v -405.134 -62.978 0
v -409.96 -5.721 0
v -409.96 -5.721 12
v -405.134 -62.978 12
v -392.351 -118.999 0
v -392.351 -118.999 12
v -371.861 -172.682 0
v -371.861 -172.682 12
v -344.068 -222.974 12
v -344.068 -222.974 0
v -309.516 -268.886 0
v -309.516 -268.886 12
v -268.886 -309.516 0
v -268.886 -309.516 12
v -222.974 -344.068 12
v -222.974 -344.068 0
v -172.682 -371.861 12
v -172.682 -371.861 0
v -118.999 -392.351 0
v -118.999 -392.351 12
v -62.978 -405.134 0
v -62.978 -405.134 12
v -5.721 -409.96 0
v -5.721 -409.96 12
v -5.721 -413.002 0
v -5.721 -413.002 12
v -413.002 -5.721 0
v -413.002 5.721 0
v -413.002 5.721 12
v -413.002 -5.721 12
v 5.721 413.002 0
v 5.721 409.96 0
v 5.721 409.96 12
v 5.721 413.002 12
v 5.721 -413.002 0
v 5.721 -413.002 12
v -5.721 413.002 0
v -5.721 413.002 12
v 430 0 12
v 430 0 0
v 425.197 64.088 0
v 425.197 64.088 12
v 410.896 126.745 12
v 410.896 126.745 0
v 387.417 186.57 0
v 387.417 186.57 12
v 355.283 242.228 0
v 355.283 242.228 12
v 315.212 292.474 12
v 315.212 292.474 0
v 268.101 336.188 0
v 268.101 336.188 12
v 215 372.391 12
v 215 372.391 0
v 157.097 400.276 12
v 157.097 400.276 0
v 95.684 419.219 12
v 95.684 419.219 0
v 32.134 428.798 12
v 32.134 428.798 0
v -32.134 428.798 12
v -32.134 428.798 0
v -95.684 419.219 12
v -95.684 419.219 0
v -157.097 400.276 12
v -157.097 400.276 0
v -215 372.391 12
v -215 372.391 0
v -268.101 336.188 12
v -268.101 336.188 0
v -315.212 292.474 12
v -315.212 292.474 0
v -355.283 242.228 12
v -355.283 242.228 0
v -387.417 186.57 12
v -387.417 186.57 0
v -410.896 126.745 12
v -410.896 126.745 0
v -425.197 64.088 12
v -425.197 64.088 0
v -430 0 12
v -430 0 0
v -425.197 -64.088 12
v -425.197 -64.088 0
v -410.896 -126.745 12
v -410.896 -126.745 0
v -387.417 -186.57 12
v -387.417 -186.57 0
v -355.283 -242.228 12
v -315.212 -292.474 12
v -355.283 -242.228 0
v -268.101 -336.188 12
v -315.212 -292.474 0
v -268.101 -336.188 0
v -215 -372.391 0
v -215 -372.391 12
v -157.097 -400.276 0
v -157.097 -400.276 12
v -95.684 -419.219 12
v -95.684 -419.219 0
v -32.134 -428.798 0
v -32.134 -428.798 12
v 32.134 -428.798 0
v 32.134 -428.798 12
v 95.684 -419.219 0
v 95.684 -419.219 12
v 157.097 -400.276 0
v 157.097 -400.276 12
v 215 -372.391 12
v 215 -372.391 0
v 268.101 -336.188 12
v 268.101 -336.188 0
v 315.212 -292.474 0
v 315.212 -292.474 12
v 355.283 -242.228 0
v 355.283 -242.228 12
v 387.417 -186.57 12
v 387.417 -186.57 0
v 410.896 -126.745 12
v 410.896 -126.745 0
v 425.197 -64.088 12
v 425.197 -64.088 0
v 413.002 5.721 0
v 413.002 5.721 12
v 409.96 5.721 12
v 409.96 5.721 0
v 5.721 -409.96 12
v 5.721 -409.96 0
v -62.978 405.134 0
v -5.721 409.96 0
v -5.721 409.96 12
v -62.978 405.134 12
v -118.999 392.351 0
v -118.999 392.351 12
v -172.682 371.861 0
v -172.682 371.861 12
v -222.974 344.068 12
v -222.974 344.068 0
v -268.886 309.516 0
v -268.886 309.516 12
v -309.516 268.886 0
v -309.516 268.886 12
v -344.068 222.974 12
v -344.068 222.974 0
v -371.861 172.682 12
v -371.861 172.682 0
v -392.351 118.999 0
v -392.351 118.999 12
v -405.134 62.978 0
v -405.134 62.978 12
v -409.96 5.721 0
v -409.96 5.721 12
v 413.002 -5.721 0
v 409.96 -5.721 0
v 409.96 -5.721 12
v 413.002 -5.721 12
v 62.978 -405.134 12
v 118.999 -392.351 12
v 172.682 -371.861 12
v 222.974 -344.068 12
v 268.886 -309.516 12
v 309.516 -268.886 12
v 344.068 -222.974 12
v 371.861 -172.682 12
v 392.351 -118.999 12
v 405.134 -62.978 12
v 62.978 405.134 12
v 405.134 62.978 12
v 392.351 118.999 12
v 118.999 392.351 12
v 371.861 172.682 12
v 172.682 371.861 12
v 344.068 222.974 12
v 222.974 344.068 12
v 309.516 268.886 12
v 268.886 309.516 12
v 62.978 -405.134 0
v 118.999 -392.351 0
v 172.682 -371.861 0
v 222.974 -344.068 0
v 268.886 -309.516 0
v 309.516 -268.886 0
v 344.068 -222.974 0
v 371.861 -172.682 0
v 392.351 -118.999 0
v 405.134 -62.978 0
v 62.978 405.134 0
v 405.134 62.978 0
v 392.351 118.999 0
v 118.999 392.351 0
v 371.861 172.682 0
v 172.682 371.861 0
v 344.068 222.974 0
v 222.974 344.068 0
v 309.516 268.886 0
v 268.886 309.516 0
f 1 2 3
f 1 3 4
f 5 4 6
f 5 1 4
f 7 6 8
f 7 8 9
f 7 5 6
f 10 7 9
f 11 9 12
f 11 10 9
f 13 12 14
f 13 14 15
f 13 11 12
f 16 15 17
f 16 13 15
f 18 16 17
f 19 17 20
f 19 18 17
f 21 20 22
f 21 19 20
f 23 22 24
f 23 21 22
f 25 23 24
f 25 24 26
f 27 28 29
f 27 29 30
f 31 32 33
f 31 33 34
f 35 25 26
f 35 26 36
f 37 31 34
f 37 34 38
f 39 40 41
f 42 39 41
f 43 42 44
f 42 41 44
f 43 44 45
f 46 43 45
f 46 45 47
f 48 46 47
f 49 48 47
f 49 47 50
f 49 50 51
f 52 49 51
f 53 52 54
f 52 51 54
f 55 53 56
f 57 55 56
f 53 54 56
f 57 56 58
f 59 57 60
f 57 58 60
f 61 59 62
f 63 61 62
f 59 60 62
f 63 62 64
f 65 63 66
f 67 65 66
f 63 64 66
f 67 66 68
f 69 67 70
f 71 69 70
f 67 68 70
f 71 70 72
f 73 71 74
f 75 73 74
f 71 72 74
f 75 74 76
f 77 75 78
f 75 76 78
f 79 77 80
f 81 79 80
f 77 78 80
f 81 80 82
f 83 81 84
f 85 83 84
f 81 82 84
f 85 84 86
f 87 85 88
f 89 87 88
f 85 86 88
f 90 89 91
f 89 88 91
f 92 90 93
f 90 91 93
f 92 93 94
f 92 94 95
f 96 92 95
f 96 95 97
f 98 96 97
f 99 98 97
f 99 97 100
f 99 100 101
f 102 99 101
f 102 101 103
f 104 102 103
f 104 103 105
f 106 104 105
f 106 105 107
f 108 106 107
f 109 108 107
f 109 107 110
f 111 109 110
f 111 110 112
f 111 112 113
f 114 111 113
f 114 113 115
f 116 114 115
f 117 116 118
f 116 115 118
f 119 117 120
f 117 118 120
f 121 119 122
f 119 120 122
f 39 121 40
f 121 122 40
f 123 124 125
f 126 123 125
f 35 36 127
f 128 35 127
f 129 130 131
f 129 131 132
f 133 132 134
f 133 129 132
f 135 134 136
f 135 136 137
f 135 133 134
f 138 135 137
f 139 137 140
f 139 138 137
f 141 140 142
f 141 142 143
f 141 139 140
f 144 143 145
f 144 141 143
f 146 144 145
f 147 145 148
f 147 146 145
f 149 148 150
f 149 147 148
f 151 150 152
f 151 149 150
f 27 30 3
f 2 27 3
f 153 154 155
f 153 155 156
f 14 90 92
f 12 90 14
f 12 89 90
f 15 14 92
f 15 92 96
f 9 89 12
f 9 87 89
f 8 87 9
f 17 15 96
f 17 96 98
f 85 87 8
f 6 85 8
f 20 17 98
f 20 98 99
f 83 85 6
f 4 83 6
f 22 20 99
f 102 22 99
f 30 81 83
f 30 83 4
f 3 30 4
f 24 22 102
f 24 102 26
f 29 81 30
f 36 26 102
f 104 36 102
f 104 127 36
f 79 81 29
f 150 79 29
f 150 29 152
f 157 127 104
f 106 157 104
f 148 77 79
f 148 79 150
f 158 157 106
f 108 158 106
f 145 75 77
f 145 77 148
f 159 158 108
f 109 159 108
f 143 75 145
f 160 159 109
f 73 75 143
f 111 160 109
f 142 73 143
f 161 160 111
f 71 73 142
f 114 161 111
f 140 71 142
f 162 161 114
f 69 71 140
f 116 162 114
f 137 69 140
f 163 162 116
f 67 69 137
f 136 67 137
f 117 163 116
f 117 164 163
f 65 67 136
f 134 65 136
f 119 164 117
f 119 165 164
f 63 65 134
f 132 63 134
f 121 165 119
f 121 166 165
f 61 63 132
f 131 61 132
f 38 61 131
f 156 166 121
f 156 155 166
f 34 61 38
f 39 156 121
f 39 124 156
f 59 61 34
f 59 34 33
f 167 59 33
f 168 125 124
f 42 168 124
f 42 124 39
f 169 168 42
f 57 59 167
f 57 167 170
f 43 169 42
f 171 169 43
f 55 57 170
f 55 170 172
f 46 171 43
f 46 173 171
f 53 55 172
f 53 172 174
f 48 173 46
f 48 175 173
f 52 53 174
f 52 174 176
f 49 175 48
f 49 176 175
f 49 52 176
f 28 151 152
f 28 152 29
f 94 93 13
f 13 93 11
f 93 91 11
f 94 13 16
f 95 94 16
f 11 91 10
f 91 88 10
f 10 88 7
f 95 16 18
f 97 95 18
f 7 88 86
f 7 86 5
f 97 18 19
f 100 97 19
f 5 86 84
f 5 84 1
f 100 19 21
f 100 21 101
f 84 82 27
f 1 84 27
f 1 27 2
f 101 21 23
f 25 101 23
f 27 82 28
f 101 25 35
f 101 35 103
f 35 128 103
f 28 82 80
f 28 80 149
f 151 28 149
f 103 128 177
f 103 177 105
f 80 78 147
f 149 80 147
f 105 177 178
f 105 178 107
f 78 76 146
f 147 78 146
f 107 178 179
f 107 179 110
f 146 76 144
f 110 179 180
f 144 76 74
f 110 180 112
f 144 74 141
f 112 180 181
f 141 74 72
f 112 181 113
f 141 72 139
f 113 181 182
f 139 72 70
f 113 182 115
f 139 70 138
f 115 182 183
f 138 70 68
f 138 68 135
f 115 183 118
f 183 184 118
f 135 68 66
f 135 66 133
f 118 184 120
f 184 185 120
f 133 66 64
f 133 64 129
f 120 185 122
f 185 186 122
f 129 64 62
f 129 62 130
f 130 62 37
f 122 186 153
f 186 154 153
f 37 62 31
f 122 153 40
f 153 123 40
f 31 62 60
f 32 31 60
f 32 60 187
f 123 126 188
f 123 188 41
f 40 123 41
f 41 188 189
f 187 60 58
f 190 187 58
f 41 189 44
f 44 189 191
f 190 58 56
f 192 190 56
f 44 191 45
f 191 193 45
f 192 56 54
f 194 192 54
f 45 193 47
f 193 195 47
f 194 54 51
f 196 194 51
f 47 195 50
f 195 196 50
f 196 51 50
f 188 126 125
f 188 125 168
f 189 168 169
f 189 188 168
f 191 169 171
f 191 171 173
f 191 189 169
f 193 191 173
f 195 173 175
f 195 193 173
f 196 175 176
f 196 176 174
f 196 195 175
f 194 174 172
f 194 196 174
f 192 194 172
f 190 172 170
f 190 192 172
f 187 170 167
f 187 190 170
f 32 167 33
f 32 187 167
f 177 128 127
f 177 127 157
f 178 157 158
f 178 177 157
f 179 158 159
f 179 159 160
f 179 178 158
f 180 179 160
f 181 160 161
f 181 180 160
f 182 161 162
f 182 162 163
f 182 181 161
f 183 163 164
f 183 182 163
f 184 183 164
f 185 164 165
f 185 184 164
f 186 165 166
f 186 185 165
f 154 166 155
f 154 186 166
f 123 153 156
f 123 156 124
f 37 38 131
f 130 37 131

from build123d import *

# Parameters (mm, degrees)
SKETCH1_R           = 430
BOSS_EXTRUDE1_DEPTH = 12


with BuildPart() as part:
    # Sketch1 → Boss-Extrude1 (new body)
    with BuildSketch(Plane.XY):
        Circle(SKETCH1_R)
        with BuildLine():
            Line((413.001947093, 5.720930233), (409.96008459, 5.720930233))
            ThreePointArc((409.96008459, 5.720930233), (289.913780286, 289.913780286), (5.720930233, 409.96008459))
            Line((5.720930233, 409.96008459), (5.720930233, 413.001947093))
            Line((5.720930233, 413.001947093), (-5.720930233, 413.001947093))
            Line((-5.720930233, 413.001947093), (-5.720930233, 409.96008459))
            ThreePointArc((-5.720930233, 409.96008459), (-289.913780286, 289.913780286), (-409.96008459, 5.720930233))
            Line((-409.96008459, 5.720930233), (-413.001947093, 5.720930233))
            Line((-413.001947093, 5.720930233), (-413.001947093, -5.720930233))
            Line((-413.001947093, -5.720930233), (-409.96008459, -5.720930233))
            ThreePointArc((-409.96008459, -5.720930233), (-289.913780286, -289.913780286), (-5.720930233, -409.96008459))
            Line((-5.720930233, -409.96008459), (-5.720930233, -413.001947093))
            Line((-5.720930233, -413.001947093), (5.720930233, -413.001947093))
            Line((5.720930233, -413.001947093), (5.720930233, -409.96008459))
            ThreePointArc((5.720930233, -409.96008459), (289.913780286, -289.913780286), (409.96008459, -5.720930233))
            Line((409.96008459, -5.720930233), (413.001947093, -5.720930233))
            Line((413.001947093, -5.720930233), (413.001947093, 5.720930233))
        make_face(mode=Mode.SUBTRACT)
    extrude(amount=BOSS_EXTRUDE1_DEPTH)


solid = part.part
